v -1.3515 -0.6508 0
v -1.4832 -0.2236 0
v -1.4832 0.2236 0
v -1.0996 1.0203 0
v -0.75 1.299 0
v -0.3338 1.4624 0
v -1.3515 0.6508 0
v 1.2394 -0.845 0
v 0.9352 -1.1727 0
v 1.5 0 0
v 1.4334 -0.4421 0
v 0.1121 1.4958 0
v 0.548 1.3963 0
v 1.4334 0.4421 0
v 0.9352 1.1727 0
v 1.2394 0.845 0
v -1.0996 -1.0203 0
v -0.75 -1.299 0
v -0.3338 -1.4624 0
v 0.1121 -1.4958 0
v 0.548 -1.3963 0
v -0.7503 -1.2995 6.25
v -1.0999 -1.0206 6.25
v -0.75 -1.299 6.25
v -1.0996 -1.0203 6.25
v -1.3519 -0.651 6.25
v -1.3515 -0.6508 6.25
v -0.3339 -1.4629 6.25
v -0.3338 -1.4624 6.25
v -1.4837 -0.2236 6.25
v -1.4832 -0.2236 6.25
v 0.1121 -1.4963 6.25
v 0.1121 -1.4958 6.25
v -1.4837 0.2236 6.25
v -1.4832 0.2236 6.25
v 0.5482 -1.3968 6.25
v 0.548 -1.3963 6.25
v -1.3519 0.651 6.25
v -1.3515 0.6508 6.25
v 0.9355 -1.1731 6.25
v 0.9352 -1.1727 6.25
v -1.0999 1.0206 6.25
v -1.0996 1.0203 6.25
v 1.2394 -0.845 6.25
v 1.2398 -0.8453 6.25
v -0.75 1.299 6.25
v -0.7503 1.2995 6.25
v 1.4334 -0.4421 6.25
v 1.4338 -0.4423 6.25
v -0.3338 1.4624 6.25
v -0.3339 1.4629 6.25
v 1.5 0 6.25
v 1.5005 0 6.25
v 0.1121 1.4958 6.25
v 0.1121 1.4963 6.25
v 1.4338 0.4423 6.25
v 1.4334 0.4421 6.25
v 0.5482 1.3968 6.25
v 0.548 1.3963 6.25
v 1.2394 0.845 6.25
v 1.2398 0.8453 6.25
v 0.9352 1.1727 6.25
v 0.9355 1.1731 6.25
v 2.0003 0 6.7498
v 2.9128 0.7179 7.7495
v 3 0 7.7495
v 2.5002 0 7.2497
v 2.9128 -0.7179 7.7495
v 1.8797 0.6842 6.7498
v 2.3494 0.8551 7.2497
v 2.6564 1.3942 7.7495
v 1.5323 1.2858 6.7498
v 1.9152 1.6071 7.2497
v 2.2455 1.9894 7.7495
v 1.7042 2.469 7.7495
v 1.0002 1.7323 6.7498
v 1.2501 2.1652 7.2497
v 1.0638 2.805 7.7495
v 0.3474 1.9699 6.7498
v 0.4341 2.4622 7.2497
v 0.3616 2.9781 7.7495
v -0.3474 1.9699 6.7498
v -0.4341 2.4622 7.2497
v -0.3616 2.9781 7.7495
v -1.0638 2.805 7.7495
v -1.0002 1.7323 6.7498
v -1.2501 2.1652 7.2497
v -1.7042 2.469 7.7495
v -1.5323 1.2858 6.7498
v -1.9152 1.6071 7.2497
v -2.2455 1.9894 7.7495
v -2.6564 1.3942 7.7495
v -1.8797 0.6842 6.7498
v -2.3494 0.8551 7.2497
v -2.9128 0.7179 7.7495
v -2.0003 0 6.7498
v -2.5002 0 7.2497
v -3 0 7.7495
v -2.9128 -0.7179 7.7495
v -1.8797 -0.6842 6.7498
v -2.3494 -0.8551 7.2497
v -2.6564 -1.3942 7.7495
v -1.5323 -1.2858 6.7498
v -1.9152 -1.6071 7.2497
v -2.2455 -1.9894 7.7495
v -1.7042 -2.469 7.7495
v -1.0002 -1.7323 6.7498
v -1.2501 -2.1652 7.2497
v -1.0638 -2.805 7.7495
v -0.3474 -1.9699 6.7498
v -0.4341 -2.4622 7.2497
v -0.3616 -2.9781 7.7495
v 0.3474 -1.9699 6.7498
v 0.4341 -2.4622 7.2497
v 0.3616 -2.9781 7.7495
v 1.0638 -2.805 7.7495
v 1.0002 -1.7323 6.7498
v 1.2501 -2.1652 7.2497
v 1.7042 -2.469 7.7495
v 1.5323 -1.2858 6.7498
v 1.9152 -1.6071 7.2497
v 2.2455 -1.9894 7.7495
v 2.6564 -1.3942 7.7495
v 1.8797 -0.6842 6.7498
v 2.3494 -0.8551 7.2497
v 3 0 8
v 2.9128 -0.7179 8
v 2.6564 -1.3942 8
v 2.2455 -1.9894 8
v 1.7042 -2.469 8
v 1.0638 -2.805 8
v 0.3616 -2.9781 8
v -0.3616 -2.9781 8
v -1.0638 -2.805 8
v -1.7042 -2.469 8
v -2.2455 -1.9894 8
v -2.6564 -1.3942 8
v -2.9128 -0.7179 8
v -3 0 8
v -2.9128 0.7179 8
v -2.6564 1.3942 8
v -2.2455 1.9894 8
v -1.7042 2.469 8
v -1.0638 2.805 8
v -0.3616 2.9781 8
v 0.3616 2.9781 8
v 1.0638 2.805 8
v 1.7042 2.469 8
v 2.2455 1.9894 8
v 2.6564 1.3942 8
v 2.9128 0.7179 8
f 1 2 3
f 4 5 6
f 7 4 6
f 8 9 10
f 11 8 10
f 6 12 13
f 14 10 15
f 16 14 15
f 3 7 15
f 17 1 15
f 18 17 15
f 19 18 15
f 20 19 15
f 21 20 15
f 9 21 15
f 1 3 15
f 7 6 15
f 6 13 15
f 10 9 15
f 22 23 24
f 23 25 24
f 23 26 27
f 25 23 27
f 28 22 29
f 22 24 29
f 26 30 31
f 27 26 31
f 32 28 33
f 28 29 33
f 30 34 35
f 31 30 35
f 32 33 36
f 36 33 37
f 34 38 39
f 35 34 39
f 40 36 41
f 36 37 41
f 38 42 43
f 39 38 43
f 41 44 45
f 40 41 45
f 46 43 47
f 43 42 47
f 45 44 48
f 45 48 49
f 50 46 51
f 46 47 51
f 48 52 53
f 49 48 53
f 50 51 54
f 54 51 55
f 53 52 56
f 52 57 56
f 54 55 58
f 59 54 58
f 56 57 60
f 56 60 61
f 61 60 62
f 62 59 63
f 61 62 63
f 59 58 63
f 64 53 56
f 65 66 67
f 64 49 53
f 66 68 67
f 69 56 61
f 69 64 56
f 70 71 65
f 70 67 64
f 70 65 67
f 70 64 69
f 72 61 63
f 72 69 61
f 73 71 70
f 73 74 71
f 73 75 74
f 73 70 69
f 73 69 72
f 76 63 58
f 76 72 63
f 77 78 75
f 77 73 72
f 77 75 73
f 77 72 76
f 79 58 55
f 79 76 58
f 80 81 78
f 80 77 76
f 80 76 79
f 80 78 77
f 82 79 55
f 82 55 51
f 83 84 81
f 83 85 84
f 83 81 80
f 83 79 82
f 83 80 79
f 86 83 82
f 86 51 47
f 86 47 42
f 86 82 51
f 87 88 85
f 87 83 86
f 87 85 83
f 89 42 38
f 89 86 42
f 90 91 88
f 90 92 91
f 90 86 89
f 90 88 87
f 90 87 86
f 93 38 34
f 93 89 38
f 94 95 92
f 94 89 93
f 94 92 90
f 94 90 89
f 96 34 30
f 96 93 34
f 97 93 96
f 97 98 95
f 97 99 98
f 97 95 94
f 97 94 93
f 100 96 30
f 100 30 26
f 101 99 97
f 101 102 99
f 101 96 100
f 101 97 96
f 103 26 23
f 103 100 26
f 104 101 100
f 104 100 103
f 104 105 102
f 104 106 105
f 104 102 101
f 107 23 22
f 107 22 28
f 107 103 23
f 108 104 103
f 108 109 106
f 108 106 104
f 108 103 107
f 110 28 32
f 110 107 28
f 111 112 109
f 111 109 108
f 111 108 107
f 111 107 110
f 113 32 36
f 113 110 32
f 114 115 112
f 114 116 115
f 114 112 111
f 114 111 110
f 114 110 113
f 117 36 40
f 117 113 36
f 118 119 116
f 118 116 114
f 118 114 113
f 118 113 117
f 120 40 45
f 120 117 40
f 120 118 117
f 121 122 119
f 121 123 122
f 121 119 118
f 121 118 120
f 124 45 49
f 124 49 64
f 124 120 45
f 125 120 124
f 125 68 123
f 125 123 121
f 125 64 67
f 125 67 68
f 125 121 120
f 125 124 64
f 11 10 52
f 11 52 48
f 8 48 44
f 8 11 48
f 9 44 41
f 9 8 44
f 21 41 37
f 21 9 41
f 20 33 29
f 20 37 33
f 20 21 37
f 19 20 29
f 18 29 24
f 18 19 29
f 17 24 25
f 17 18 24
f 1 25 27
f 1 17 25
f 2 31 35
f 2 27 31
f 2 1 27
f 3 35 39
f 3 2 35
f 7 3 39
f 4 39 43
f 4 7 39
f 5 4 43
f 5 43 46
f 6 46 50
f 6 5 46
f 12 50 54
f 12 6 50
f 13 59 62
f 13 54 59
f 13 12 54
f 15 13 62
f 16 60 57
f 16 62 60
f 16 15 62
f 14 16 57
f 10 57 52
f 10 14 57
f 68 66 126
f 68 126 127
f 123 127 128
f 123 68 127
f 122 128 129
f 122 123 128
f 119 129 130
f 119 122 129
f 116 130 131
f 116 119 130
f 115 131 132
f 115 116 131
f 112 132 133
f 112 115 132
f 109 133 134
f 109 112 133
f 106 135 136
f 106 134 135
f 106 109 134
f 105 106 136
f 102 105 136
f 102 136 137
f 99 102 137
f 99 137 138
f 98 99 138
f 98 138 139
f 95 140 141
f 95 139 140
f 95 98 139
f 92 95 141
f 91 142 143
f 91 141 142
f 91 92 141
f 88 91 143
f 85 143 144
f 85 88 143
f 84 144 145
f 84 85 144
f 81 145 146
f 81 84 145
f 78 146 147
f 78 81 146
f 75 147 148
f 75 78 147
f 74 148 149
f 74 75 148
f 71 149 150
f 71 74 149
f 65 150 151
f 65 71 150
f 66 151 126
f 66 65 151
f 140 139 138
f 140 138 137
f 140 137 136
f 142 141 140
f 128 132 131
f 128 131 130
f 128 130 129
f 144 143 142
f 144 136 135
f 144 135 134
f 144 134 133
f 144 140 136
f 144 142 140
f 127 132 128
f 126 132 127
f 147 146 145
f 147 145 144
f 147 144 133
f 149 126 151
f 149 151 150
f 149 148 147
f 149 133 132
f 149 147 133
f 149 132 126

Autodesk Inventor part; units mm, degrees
ref_plane "YZ Plane" through (0, 0, 0) normal (1, 0, 0) x (0, 1, 0)
ref_plane "XZ Plane" through (0, 0, 0) normal (0, 1, 0) x (-1, 0, 0)
ref_plane "XY Plane" through (0, 0, 0) normal (0, 0, 1) x (1, 0, 0)
sketch "スケッチ1" plane through (0, 0, 0) normal (0, 0, 1) x (1, 0, 0)
  circle A0 centre (0, 0) radius 1.5
  dimension "d0" = 3
extrude "押し出し1" add sketch "スケッチ1" along normal blind 6.25
sketch "スケッチ2" plane through (0, 0, 6.25) normal (0, 0, 1) x (1, 0, 0)
  circle A0 centre (0, 0) radius 1.5 projected
  circle A1 centre (0, 0) radius 3
  dimension "d3" = 6
extrude "押し出し2" add sketch "スケッチ2" along normal blind 1.75 contours A0 | A1
thread "ねじ1" size "M3x0.5" class "6g" standard "ANSI Metric M Profile" full length
chamfer "面取り1" distance 1.5 angle 45 1 edges at (-3, 0, 6.25)
properties part number "SB　8mm皿ネジ" material "Steel, Mild"
